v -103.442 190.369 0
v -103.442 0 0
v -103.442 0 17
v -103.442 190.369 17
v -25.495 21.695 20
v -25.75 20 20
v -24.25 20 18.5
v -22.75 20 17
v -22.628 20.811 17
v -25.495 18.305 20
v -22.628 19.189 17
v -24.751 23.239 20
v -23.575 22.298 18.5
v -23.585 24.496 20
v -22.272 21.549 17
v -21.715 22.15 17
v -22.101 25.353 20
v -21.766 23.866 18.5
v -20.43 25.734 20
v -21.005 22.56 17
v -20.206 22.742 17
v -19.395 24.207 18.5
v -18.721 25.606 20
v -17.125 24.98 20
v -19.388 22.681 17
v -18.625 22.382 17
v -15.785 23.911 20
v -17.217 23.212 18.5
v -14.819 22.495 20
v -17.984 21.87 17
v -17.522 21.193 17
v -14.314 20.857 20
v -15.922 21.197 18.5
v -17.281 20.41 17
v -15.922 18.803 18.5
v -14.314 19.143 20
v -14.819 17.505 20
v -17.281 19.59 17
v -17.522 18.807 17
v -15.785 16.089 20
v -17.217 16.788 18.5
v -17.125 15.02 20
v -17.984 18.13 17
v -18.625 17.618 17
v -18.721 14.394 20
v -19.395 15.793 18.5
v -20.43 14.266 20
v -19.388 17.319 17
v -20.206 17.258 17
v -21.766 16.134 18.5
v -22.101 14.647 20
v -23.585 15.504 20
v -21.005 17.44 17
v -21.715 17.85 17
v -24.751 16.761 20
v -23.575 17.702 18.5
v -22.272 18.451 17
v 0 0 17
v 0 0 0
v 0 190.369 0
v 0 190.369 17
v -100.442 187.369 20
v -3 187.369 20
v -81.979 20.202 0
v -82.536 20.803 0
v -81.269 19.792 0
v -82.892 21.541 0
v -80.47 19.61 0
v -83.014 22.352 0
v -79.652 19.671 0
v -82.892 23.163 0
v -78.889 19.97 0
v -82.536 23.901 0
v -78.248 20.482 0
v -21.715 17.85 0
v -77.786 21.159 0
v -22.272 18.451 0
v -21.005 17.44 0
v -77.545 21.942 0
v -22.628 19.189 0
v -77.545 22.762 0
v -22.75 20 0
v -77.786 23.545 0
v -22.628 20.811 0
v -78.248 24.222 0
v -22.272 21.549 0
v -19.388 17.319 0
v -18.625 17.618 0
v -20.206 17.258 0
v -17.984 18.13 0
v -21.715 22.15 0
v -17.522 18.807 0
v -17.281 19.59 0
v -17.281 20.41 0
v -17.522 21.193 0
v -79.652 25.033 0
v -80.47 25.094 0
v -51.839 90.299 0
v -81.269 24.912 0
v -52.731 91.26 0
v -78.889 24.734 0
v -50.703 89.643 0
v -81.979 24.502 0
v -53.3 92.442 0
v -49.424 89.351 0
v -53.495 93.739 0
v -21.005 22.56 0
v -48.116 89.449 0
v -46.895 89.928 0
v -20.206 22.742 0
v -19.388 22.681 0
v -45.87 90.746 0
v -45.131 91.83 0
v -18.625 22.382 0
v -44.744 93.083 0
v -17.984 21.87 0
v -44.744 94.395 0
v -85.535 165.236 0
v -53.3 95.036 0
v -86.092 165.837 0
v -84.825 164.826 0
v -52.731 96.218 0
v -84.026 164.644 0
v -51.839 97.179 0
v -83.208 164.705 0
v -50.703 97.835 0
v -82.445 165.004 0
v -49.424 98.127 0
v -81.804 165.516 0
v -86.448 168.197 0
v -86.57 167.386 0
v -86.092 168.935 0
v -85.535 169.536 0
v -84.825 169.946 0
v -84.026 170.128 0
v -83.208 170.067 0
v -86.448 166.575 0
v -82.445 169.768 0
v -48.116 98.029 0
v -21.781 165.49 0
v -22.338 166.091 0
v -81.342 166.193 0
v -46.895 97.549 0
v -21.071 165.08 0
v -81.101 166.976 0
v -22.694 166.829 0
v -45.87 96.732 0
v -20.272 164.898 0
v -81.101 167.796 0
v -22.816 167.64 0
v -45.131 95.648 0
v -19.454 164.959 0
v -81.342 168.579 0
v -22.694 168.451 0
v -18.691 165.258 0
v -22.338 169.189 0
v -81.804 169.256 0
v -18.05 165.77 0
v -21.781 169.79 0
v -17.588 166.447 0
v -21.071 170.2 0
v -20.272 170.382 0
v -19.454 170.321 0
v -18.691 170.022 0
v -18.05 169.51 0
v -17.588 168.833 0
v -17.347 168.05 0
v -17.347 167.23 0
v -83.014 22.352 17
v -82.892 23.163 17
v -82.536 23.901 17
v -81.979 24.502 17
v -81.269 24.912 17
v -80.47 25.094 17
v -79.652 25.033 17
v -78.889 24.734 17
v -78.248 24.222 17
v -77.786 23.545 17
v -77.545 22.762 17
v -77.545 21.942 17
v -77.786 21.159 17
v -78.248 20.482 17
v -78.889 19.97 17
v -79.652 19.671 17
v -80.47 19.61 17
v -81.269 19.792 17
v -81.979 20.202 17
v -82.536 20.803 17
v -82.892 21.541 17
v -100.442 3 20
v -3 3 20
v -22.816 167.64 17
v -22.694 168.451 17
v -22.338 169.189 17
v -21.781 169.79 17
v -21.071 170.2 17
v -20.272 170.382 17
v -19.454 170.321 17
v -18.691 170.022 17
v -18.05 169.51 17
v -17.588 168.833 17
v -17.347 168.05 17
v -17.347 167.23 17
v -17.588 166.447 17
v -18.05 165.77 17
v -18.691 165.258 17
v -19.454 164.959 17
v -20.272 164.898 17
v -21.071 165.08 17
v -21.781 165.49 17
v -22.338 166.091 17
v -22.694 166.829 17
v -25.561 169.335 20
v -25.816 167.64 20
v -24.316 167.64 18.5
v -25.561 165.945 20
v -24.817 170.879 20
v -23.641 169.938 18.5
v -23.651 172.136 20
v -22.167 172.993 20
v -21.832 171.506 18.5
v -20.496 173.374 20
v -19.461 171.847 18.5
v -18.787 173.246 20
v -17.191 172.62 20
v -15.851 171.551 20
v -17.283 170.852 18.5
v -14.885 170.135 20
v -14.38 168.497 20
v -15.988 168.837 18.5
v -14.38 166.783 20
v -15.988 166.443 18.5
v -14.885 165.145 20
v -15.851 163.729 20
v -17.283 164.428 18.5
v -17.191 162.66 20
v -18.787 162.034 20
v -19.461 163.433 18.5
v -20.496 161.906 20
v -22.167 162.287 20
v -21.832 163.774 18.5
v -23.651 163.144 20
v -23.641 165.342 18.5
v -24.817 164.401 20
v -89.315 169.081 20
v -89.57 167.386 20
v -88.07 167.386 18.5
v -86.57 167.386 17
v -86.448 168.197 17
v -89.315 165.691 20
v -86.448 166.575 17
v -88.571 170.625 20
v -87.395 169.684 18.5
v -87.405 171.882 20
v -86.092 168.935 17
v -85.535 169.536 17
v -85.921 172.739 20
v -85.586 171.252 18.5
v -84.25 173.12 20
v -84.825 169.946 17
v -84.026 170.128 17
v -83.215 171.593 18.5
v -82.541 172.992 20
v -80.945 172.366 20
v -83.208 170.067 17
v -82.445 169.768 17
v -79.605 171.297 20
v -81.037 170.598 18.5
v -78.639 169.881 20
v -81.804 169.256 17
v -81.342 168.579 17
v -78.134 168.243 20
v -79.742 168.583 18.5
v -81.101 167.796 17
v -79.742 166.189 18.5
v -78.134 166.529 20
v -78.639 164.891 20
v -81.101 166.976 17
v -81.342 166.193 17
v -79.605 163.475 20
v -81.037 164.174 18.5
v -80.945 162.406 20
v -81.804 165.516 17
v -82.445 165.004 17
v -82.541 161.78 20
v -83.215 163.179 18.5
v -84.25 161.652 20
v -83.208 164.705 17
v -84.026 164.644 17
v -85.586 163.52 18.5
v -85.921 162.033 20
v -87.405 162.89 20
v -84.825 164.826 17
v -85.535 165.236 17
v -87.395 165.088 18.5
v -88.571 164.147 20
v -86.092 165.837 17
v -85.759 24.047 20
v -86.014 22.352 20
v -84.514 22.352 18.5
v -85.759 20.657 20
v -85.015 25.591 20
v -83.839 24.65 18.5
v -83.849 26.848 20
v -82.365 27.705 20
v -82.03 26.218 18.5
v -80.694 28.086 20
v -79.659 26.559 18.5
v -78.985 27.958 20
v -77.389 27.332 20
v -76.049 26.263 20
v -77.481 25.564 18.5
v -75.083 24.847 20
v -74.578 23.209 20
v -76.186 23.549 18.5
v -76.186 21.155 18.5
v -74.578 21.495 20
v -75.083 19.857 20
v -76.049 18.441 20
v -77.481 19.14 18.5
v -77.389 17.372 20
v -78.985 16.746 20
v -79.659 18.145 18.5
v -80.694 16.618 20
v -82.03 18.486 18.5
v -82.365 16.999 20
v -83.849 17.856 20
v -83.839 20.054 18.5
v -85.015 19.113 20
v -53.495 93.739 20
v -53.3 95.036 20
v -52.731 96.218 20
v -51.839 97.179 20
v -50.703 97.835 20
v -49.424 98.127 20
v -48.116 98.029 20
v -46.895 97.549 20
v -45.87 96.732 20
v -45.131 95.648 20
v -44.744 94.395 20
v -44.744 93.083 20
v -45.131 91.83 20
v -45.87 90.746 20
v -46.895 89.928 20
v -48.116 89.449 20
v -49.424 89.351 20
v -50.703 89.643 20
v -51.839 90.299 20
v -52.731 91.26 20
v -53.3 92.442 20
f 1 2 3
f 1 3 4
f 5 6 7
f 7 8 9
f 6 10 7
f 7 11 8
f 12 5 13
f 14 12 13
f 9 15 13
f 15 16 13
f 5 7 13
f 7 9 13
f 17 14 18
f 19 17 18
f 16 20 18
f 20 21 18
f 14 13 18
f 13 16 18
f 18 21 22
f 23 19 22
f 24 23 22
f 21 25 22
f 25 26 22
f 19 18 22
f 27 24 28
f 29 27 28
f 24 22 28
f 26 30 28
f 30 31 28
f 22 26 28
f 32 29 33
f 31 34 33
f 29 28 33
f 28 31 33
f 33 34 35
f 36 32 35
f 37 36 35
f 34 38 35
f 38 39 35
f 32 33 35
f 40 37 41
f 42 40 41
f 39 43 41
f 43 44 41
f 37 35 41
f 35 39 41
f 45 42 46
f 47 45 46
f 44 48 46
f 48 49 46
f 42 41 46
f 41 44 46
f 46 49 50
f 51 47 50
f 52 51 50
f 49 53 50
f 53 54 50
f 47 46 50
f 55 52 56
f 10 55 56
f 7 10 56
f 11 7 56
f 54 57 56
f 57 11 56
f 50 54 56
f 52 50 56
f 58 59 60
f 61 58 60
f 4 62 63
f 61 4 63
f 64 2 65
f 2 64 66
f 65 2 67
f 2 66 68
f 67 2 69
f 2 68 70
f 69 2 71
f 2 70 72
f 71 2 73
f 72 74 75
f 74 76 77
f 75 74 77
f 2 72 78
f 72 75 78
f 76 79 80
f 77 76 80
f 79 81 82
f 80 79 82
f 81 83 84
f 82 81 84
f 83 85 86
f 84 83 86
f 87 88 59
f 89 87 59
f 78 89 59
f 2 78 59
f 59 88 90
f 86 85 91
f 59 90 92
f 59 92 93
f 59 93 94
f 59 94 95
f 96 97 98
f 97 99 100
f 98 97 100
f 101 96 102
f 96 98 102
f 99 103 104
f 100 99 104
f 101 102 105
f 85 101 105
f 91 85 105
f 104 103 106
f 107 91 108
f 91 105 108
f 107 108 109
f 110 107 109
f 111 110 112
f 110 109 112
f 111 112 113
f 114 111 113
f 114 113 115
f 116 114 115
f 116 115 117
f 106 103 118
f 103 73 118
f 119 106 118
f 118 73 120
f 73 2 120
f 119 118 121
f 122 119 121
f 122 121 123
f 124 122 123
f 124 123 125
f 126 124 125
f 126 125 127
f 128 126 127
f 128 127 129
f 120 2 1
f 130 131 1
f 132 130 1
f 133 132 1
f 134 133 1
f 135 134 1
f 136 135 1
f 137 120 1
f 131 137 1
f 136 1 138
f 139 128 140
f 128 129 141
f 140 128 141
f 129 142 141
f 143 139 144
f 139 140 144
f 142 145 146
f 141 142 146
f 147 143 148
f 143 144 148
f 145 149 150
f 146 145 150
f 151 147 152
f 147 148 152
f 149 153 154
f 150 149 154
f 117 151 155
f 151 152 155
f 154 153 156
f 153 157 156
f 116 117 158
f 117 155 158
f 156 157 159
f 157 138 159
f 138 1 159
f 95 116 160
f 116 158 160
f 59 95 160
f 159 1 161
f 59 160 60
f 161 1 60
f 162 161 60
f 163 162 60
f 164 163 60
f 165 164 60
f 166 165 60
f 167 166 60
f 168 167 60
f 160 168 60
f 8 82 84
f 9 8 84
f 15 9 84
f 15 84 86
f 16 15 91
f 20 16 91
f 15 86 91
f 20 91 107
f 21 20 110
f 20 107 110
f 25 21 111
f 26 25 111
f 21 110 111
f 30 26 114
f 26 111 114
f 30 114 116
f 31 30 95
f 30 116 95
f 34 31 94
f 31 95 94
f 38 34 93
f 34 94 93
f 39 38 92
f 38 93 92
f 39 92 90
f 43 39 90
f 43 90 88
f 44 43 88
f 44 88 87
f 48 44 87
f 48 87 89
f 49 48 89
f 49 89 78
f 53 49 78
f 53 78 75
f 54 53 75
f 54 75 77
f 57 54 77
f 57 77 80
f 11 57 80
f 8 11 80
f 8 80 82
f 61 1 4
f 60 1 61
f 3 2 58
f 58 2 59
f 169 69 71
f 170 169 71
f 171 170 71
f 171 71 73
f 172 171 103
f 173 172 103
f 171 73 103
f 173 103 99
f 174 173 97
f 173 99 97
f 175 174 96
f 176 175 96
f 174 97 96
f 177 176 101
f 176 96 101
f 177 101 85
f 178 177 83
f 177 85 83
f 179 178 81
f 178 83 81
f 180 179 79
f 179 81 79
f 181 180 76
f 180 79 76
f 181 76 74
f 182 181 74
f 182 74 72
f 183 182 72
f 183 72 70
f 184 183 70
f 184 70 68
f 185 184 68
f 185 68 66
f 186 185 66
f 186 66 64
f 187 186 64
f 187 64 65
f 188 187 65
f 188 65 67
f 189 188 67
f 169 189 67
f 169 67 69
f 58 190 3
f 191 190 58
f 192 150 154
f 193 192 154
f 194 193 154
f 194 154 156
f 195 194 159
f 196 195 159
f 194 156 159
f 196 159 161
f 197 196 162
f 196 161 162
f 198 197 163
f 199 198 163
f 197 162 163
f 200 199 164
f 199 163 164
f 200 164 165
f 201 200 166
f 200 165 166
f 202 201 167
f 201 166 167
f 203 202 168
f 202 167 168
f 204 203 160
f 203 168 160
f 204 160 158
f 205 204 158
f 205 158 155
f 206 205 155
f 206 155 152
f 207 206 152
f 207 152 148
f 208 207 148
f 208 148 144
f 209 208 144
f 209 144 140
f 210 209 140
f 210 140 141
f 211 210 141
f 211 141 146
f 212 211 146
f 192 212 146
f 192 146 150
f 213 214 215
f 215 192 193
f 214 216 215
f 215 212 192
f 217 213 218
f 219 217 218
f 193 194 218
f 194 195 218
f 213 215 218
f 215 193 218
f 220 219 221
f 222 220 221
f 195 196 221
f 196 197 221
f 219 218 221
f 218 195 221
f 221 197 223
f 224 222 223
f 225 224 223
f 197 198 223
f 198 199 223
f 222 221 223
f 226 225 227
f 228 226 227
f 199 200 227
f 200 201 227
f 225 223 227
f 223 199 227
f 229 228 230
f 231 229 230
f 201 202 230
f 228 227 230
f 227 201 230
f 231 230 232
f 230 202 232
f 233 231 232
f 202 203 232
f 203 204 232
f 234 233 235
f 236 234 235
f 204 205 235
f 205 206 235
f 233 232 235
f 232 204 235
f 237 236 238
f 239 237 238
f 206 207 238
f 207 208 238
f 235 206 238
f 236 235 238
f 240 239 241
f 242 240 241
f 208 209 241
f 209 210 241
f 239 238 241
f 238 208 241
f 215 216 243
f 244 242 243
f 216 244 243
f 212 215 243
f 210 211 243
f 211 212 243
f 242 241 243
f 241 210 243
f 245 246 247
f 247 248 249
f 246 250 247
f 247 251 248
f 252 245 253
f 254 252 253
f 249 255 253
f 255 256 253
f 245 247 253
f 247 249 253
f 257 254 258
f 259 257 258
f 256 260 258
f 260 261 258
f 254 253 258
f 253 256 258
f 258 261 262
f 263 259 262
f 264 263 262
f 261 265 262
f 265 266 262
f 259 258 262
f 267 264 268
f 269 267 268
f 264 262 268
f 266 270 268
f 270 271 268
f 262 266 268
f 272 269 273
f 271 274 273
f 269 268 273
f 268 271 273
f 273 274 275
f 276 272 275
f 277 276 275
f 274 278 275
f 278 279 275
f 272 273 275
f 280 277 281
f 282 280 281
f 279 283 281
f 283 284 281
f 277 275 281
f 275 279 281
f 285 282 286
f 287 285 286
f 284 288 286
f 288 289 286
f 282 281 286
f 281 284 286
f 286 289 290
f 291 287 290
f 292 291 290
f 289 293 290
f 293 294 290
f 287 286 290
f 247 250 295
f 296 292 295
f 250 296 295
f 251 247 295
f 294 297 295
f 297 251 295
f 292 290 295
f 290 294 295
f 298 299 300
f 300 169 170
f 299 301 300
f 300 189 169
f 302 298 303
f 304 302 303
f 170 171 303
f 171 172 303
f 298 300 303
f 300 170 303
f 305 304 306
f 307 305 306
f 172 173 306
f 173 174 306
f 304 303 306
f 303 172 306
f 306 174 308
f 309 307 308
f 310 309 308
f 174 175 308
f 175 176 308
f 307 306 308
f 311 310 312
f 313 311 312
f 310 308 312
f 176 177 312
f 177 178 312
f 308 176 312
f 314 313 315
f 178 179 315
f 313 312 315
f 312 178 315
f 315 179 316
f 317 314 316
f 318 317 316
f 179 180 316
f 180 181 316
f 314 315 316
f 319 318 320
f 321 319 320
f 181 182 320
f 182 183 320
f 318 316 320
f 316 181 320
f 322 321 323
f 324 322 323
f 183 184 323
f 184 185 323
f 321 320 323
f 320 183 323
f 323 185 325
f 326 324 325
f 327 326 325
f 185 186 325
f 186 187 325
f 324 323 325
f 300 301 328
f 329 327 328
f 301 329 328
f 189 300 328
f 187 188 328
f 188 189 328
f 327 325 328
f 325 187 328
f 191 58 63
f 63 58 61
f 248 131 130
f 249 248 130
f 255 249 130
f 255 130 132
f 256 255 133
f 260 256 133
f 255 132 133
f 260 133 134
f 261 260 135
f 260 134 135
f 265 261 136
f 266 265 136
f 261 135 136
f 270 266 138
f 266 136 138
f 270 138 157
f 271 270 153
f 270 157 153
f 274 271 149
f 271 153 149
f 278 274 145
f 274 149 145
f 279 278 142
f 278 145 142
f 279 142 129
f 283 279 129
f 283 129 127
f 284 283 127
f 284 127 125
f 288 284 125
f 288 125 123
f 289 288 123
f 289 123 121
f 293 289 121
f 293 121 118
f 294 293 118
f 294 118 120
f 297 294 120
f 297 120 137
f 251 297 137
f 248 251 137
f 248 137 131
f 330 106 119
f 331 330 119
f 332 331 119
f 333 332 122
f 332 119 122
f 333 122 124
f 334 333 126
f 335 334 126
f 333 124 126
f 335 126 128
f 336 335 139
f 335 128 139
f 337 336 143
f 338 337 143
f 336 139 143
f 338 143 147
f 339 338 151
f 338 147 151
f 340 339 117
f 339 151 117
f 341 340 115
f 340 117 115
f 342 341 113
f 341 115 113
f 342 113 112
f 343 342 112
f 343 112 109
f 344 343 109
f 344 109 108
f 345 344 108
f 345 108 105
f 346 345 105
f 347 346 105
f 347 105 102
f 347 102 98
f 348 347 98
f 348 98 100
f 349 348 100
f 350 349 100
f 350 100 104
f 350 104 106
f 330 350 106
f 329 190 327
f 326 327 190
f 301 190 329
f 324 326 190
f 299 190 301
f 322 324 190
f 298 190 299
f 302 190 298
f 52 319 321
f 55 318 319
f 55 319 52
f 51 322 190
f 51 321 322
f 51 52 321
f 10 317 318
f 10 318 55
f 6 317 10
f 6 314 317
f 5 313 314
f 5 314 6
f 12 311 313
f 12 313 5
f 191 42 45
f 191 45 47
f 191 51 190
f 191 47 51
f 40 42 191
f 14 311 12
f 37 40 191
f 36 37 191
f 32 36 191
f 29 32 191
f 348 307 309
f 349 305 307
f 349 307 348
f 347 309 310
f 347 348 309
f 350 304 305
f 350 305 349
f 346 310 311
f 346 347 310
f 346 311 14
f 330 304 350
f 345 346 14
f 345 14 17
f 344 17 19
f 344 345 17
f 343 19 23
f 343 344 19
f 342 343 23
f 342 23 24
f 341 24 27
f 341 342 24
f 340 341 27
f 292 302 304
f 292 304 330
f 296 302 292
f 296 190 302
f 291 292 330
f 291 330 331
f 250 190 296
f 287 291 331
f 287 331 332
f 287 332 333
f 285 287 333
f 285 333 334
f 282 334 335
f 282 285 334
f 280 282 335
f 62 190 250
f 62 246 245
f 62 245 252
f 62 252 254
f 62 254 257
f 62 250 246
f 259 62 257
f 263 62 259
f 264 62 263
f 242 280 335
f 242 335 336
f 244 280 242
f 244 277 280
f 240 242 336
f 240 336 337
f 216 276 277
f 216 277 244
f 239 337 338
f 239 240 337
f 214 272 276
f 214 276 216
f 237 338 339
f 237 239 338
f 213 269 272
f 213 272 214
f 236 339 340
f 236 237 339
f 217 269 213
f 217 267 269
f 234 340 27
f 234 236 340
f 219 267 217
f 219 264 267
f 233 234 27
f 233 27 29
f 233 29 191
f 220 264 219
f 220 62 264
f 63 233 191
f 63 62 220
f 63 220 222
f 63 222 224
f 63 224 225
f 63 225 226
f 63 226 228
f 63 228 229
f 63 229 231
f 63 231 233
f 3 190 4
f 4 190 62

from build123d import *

# Parameters (mm, degrees)
F0_W     = 103.4416258335
F0_H     = 190.3689950705
F1_DEPTH = 20
F3_D     = 5.5
F4_SIZE  = 3
F6_D     = 8.8


# Not quite as in the source:
# - a feature names something its author has since deleted; it is built from what else it names


with BuildPart() as f1:
    # F0 (on Top) → F1 (new body)
    with BuildSketch(Plane.XY):
        with Locations((-51.7208129168, 95.1844975352)):
            Rectangle(F0_W, F0_H)
    extrude(amount=F1_DEPTH)

    # F3 (through all)
    with Locations(Plane.XY.offset(20)):
        with Locations((-20, 20), (-83.82, 167.386), (-20.066, 167.64), (-80.264, 22.352)):
            Hole(F3_D / 2)

    # F4
    f4_edges = [f1.edges().sort_by_distance(p)[0] for p in [
        (-51.720813, 0, 20),
        (-103.441626, 95.184498, 20),
        (0, 95.184498, 20),
        (-51.720813, 190.368995, 20),
        (-83.014, 22.352, 20),
        (-22.75, 20, 20),
        (-86.57, 167.386, 20),
        (-22.816, 167.64, 20),
    ]]
    chamfer(f4_edges, length=F4_SIZE)

    # F6 (through all)
    with Locations(Plane.XY.offset(20)):
        with Locations((-49.0952916443, 93.7389880419)):
            Hole(F6_D / 2)


solid = f1.part
